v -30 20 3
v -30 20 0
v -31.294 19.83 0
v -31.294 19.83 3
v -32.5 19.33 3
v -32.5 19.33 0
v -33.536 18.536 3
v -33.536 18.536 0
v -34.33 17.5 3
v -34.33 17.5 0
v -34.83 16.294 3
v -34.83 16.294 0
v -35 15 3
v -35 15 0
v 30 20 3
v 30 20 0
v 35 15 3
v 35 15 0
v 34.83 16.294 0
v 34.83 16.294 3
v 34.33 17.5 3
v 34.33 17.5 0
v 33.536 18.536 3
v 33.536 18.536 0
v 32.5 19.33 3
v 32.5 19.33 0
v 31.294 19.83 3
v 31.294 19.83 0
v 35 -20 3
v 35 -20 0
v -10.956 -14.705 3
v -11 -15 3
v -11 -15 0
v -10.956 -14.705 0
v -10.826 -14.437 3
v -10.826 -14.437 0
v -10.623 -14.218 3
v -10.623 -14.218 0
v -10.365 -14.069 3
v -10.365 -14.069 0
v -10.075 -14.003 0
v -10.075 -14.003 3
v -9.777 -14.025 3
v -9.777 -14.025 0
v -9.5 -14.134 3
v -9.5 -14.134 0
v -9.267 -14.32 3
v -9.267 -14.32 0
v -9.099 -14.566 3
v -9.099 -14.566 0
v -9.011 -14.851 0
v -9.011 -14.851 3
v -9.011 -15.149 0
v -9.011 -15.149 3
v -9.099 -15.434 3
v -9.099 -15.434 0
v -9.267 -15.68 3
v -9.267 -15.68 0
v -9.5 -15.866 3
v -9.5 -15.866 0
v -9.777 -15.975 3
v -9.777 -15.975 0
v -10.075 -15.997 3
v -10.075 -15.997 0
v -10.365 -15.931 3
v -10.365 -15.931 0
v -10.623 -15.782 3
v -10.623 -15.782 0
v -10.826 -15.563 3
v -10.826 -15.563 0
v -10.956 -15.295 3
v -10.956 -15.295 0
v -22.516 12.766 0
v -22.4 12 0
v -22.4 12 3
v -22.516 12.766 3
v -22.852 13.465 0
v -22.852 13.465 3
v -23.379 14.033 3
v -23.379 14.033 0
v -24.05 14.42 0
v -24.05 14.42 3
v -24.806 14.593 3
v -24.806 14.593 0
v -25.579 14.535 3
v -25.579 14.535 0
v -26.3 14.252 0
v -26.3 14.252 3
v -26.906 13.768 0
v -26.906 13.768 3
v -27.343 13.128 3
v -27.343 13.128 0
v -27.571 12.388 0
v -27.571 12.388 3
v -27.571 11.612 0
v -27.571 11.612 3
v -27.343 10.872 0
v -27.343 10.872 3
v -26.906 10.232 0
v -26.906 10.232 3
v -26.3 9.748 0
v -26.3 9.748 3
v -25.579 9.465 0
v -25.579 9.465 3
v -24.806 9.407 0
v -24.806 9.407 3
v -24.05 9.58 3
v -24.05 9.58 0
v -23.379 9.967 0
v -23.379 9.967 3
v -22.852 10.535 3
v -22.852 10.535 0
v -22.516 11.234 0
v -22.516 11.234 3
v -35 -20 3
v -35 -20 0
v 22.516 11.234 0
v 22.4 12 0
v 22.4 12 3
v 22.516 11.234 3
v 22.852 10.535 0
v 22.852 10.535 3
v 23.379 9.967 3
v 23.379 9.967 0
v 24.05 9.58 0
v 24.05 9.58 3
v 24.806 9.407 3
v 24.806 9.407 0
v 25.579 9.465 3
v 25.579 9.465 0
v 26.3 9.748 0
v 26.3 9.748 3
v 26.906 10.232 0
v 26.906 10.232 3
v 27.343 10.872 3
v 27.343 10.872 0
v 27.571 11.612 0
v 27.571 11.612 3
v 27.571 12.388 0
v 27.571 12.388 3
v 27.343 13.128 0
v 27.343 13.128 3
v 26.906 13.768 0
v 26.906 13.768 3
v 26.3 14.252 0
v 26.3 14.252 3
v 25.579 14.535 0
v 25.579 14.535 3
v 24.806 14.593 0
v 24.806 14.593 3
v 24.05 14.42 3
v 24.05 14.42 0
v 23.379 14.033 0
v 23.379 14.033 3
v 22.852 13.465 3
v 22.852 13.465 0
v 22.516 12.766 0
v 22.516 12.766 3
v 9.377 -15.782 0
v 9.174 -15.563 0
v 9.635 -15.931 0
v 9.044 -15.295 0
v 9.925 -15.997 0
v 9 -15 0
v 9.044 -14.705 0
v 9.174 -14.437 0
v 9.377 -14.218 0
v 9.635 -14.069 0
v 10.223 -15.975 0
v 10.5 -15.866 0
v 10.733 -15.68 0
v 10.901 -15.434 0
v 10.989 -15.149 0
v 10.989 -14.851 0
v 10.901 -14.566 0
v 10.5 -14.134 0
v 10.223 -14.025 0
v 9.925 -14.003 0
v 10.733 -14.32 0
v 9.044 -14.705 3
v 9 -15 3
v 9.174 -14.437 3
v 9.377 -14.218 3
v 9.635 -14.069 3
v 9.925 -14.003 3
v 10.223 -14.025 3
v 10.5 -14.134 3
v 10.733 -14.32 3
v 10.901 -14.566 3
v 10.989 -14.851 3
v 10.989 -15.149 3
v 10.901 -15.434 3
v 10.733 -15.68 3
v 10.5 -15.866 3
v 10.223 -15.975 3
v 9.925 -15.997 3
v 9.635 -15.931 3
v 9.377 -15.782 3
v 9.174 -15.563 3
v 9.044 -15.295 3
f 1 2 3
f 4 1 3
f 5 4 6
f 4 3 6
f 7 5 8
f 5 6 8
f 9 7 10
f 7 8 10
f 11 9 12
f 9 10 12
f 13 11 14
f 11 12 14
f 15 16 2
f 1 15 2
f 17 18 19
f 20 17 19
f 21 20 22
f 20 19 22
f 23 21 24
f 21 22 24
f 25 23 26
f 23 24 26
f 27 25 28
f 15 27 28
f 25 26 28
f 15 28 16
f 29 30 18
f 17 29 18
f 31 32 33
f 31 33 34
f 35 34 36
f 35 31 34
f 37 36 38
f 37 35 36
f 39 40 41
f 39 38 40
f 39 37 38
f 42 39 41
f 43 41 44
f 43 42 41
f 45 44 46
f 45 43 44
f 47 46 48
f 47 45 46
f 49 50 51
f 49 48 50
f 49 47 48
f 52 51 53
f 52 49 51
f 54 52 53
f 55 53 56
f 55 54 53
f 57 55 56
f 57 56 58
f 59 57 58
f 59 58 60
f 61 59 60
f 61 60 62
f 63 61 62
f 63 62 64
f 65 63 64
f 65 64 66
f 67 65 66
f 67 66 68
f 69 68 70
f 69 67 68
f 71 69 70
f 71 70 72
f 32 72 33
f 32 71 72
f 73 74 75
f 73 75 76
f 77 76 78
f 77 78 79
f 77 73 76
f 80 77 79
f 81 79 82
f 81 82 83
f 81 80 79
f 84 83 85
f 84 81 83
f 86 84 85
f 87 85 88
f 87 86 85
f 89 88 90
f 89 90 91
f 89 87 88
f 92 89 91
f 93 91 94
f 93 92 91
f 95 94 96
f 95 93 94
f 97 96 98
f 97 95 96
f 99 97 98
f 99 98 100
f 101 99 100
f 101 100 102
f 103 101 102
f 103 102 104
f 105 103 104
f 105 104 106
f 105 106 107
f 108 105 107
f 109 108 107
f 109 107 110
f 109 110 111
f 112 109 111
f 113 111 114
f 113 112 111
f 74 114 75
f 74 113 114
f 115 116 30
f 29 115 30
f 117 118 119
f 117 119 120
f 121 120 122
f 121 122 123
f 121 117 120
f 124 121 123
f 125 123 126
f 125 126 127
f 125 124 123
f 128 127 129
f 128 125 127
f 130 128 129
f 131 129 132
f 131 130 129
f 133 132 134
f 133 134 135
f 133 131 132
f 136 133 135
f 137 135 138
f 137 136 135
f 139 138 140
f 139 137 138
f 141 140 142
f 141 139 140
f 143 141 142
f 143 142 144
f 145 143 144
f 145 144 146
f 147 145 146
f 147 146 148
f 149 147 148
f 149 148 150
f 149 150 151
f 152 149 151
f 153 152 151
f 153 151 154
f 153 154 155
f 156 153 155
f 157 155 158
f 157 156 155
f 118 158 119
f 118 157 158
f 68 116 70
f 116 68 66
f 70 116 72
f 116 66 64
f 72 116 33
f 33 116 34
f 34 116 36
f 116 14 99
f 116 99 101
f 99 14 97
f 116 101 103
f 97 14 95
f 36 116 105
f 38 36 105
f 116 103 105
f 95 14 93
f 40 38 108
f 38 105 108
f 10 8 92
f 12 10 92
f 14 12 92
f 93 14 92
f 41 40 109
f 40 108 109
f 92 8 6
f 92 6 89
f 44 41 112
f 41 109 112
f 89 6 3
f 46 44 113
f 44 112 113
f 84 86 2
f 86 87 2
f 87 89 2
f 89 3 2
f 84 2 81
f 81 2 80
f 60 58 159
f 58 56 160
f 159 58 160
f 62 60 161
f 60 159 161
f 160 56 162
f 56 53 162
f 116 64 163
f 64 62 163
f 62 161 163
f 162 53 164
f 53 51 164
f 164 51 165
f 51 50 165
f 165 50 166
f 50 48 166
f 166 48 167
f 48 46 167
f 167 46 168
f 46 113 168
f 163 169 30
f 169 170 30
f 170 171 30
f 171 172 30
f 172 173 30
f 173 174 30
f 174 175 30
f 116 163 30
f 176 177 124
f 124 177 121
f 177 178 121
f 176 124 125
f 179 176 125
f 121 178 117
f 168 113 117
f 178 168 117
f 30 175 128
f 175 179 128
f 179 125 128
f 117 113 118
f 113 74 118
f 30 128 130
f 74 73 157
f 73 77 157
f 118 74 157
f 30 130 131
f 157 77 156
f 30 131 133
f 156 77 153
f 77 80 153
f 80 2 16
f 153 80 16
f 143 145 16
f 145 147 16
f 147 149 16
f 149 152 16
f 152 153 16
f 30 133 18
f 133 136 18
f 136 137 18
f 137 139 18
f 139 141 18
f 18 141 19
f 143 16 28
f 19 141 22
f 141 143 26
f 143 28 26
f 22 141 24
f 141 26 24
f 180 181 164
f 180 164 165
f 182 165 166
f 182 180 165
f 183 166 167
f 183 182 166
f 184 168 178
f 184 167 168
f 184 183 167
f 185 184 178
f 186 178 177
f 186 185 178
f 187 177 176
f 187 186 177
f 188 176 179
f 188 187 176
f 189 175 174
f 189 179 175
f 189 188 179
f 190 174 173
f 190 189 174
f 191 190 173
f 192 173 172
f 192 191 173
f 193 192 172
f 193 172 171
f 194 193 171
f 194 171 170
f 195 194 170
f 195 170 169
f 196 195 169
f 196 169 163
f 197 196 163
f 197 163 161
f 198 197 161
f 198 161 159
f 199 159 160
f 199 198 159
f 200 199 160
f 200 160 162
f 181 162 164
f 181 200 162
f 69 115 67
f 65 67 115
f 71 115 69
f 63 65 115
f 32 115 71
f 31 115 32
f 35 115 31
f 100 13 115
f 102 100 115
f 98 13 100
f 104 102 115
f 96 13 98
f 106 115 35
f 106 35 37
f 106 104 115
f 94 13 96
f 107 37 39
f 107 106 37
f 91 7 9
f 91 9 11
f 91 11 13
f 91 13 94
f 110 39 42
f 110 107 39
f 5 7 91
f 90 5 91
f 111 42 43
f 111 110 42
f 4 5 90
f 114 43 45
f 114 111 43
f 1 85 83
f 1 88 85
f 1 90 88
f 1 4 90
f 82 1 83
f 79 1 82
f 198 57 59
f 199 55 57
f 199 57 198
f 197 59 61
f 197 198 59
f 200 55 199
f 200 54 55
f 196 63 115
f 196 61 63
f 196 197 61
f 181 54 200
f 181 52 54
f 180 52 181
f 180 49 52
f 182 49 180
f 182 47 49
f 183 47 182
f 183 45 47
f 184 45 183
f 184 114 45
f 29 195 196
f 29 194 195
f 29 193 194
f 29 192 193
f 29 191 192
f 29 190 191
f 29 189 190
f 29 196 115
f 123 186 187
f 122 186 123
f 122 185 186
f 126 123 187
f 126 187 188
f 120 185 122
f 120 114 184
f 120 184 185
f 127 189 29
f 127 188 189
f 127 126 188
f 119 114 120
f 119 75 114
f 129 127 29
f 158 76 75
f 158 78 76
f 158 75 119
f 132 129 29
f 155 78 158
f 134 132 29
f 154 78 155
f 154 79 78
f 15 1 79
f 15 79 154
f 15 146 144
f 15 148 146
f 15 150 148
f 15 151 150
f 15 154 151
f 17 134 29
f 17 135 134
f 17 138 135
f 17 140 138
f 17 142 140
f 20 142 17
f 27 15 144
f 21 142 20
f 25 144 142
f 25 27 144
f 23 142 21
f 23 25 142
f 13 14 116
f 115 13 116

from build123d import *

# Parameters (mm, degrees)
SKETCH_1_R               = 2.6
EXTRUDE_1_DEPTH          = 3
CUT_EXTRUDE_1_DEPTH      = 41.422765863
CUT_EXTRUDE_1_DEPTH_BACK = 41.422765863
SKETCH_2_R               = 1


with BuildPart() as part:
    # Sketch 1 → 凸台-拉伸1 (new body)
    with BuildSketch(Plane.XY):
        with BuildLine():
            Line((-35, -20), (35, -20))
            Line((35, -20), (35, 15))
            ThreePointArc((35, 15), (33.535533906, 18.535533906), (30, 20))
            Line((30, 20), (-30, 20))
            ThreePointArc((-30, 20), (-33.535533906, 18.535533906), (-35, 15))
            Line((-35, 15), (-35, -20))
        make_face()
        with Locations((-25, 12)):
            Circle(SKETCH_1_R, mode=Mode.SUBTRACT)
        with Locations(Location((25, 12, 0), (0, 0, 180))):
            Circle(SKETCH_1_R, mode=Mode.SUBTRACT)
    extrude(amount=EXTRUDE_1_DEPTH)

    # Sketch 2 → 切除-拉伸1 (cut, two sides: drawn at the far end of the back side and taken through both)
    with BuildSketch(Plane(origin=(0, 0, 0), x_dir=(-1, 0, 0), z_dir=(0, 0, -1)).offset(-CUT_EXTRUDE_1_DEPTH_BACK)):
        with Locations((-10, -15)):
            Circle(SKETCH_2_R)
        with Locations((10, -15)):
            Circle(SKETCH_2_R)
    extrude(amount=CUT_EXTRUDE_1_DEPTH + CUT_EXTRUDE_1_DEPTH_BACK, mode=Mode.SUBTRACT)


solid = part.part
